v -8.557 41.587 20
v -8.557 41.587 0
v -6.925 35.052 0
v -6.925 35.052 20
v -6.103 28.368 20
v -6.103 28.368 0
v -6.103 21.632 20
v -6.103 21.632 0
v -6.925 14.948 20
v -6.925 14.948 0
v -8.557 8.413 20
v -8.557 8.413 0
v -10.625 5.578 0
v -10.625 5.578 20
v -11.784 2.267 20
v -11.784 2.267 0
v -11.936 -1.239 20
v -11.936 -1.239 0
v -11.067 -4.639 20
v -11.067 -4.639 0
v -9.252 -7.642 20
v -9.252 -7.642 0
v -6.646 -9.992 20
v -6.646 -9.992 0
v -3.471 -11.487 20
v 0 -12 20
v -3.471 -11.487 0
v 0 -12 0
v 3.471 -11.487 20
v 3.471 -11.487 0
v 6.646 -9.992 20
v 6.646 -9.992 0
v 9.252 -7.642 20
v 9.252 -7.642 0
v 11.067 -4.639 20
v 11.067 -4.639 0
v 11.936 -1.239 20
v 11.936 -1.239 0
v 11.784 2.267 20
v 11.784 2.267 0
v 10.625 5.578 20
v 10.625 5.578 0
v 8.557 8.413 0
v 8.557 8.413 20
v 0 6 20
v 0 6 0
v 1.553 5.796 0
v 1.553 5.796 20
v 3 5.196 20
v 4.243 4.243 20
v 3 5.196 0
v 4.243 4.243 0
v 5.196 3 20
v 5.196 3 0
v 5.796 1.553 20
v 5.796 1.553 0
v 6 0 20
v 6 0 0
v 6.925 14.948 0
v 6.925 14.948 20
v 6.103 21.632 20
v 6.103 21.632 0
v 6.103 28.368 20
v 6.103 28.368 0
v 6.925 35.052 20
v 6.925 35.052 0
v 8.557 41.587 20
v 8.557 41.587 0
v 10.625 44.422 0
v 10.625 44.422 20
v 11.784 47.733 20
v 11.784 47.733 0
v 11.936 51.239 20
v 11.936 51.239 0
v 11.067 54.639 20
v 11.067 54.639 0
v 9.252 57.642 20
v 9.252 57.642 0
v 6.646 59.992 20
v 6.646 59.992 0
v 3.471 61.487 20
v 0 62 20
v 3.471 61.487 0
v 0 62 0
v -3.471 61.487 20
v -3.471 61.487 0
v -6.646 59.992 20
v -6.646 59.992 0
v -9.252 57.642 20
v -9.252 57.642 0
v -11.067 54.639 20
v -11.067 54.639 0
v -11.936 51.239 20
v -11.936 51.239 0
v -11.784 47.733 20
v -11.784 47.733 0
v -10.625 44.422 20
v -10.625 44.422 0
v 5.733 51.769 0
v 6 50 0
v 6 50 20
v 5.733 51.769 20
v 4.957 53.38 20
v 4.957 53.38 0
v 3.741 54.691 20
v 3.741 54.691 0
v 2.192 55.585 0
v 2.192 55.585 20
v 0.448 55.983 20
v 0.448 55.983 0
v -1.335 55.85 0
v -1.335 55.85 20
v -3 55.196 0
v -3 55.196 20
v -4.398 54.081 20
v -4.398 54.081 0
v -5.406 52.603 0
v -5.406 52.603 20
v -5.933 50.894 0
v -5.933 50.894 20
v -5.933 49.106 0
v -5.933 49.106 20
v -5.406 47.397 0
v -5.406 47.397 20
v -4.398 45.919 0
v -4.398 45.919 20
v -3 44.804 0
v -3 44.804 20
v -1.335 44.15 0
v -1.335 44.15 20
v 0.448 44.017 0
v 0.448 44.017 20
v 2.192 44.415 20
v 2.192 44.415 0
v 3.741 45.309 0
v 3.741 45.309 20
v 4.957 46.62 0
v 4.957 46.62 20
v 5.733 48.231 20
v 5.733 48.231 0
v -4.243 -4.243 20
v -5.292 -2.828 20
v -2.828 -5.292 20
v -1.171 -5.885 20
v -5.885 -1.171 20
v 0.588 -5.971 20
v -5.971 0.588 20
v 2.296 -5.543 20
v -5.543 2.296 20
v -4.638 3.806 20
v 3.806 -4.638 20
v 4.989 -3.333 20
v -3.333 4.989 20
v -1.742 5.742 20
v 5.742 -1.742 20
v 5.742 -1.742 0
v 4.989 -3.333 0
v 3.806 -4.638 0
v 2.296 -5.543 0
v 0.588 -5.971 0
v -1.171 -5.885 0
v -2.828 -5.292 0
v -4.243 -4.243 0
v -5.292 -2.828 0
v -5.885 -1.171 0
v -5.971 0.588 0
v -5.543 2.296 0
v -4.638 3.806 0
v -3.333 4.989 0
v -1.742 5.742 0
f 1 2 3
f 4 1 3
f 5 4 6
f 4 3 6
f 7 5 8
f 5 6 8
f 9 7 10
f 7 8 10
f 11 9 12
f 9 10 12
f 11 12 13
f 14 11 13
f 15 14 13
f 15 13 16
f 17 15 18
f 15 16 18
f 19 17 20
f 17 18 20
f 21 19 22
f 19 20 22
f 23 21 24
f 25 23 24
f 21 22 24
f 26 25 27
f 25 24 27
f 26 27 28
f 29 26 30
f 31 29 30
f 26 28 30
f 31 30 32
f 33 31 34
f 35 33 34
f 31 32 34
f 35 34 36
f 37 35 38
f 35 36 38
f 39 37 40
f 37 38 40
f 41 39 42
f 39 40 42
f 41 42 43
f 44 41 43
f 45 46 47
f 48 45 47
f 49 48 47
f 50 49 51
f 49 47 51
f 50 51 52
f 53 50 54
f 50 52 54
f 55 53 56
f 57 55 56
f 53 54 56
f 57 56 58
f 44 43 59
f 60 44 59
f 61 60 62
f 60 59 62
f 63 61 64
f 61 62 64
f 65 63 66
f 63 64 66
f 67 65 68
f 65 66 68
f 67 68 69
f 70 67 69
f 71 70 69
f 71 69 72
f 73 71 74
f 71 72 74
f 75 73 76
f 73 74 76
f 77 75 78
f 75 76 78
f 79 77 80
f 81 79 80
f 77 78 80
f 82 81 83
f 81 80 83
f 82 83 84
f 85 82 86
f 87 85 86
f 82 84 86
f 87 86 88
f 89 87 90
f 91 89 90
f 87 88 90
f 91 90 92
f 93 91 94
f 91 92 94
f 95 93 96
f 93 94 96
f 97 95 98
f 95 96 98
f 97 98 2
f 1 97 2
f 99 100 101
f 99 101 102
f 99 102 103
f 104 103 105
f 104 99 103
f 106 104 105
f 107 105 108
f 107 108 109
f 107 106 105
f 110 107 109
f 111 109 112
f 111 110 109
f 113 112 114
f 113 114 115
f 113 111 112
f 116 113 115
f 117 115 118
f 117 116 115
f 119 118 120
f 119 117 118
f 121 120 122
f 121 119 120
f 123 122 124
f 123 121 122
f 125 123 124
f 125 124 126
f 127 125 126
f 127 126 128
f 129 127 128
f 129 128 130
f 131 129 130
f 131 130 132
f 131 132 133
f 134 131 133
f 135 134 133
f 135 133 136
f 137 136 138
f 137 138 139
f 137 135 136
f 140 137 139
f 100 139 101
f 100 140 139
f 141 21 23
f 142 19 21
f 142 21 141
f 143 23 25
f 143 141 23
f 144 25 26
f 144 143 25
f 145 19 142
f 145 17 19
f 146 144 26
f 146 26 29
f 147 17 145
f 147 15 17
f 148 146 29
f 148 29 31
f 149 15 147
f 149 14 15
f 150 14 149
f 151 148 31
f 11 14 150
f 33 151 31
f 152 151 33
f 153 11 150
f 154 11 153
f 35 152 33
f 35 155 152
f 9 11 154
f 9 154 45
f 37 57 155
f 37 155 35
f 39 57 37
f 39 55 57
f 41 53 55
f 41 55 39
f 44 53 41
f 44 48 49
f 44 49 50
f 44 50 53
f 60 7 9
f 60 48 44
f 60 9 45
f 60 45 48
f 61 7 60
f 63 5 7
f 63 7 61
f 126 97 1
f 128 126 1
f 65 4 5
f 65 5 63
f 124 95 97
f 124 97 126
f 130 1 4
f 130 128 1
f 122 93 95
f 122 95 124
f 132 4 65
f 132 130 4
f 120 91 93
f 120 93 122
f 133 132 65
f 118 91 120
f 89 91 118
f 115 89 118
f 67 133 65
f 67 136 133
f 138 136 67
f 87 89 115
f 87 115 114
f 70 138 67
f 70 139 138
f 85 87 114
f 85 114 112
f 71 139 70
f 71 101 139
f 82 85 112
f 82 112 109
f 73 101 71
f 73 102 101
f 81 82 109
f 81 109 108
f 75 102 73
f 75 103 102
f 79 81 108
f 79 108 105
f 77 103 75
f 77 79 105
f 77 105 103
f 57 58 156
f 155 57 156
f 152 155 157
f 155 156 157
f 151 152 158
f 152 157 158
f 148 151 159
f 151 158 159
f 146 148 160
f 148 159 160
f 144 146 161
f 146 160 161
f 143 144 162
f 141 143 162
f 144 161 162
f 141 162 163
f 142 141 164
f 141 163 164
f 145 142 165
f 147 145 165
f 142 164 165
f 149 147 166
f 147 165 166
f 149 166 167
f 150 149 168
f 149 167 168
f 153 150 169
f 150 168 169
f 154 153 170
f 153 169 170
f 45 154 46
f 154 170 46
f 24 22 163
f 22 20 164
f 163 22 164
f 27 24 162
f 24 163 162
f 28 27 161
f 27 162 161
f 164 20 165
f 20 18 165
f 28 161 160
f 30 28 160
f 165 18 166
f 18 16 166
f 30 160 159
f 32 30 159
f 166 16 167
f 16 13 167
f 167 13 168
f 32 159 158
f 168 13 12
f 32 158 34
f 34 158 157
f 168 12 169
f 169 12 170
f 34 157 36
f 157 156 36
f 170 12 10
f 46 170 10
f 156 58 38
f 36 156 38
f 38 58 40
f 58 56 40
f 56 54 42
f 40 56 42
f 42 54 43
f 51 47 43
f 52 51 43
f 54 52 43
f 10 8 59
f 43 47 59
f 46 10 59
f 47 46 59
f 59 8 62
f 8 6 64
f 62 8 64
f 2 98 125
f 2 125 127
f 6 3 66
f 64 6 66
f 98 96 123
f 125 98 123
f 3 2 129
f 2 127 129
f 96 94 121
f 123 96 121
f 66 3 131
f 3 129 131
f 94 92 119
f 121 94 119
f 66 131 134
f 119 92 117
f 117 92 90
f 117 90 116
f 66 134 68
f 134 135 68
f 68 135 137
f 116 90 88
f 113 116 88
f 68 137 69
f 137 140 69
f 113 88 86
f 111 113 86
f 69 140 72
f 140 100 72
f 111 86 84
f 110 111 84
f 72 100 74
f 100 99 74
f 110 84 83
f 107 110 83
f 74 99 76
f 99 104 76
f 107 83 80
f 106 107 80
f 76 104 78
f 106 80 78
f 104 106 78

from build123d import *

# Parameters (mm, degrees)
F0_R     = 6
F1_DEPTH = 20


with BuildPart() as f1:
    # F0 (on Top) → F1 (new body)
    with BuildSketch(Plane.XY):
        with BuildLine():
            ThreePointArc((0, 6), (-4.242641, -4.242641), (6, 0))
            ThreePointArc((6, 0), (4.242641, 4.242641), (0, 6))
        make_face()
        with BuildLine():
            ThreePointArc((8.556611, 8.413347), (6, 25), (8.556611, 41.586653))
            ThreePointArc((8.556611, 41.586653), (0, 62), (-8.556611, 41.586653))
            ThreePointArc((-8.556611, 41.586653), (-6, 25), (-8.556611, 8.413347))
            ThreePointArc((-8.556611, 8.413347), (0, -12), (8.556611, 8.413347))
        make_face()
        with BuildLine():
            ThreePointArc((0, 6), (4.242641, 4.242641), (6, 0))
            ThreePointArc((6, 0), (-4.242641, -4.242641), (0, 6))
        make_face(mode=Mode.SUBTRACT)
        with Locations((0, 50)):
            Circle(F0_R, mode=Mode.SUBTRACT)
    extrude(amount=F1_DEPTH)


solid = f1.part
